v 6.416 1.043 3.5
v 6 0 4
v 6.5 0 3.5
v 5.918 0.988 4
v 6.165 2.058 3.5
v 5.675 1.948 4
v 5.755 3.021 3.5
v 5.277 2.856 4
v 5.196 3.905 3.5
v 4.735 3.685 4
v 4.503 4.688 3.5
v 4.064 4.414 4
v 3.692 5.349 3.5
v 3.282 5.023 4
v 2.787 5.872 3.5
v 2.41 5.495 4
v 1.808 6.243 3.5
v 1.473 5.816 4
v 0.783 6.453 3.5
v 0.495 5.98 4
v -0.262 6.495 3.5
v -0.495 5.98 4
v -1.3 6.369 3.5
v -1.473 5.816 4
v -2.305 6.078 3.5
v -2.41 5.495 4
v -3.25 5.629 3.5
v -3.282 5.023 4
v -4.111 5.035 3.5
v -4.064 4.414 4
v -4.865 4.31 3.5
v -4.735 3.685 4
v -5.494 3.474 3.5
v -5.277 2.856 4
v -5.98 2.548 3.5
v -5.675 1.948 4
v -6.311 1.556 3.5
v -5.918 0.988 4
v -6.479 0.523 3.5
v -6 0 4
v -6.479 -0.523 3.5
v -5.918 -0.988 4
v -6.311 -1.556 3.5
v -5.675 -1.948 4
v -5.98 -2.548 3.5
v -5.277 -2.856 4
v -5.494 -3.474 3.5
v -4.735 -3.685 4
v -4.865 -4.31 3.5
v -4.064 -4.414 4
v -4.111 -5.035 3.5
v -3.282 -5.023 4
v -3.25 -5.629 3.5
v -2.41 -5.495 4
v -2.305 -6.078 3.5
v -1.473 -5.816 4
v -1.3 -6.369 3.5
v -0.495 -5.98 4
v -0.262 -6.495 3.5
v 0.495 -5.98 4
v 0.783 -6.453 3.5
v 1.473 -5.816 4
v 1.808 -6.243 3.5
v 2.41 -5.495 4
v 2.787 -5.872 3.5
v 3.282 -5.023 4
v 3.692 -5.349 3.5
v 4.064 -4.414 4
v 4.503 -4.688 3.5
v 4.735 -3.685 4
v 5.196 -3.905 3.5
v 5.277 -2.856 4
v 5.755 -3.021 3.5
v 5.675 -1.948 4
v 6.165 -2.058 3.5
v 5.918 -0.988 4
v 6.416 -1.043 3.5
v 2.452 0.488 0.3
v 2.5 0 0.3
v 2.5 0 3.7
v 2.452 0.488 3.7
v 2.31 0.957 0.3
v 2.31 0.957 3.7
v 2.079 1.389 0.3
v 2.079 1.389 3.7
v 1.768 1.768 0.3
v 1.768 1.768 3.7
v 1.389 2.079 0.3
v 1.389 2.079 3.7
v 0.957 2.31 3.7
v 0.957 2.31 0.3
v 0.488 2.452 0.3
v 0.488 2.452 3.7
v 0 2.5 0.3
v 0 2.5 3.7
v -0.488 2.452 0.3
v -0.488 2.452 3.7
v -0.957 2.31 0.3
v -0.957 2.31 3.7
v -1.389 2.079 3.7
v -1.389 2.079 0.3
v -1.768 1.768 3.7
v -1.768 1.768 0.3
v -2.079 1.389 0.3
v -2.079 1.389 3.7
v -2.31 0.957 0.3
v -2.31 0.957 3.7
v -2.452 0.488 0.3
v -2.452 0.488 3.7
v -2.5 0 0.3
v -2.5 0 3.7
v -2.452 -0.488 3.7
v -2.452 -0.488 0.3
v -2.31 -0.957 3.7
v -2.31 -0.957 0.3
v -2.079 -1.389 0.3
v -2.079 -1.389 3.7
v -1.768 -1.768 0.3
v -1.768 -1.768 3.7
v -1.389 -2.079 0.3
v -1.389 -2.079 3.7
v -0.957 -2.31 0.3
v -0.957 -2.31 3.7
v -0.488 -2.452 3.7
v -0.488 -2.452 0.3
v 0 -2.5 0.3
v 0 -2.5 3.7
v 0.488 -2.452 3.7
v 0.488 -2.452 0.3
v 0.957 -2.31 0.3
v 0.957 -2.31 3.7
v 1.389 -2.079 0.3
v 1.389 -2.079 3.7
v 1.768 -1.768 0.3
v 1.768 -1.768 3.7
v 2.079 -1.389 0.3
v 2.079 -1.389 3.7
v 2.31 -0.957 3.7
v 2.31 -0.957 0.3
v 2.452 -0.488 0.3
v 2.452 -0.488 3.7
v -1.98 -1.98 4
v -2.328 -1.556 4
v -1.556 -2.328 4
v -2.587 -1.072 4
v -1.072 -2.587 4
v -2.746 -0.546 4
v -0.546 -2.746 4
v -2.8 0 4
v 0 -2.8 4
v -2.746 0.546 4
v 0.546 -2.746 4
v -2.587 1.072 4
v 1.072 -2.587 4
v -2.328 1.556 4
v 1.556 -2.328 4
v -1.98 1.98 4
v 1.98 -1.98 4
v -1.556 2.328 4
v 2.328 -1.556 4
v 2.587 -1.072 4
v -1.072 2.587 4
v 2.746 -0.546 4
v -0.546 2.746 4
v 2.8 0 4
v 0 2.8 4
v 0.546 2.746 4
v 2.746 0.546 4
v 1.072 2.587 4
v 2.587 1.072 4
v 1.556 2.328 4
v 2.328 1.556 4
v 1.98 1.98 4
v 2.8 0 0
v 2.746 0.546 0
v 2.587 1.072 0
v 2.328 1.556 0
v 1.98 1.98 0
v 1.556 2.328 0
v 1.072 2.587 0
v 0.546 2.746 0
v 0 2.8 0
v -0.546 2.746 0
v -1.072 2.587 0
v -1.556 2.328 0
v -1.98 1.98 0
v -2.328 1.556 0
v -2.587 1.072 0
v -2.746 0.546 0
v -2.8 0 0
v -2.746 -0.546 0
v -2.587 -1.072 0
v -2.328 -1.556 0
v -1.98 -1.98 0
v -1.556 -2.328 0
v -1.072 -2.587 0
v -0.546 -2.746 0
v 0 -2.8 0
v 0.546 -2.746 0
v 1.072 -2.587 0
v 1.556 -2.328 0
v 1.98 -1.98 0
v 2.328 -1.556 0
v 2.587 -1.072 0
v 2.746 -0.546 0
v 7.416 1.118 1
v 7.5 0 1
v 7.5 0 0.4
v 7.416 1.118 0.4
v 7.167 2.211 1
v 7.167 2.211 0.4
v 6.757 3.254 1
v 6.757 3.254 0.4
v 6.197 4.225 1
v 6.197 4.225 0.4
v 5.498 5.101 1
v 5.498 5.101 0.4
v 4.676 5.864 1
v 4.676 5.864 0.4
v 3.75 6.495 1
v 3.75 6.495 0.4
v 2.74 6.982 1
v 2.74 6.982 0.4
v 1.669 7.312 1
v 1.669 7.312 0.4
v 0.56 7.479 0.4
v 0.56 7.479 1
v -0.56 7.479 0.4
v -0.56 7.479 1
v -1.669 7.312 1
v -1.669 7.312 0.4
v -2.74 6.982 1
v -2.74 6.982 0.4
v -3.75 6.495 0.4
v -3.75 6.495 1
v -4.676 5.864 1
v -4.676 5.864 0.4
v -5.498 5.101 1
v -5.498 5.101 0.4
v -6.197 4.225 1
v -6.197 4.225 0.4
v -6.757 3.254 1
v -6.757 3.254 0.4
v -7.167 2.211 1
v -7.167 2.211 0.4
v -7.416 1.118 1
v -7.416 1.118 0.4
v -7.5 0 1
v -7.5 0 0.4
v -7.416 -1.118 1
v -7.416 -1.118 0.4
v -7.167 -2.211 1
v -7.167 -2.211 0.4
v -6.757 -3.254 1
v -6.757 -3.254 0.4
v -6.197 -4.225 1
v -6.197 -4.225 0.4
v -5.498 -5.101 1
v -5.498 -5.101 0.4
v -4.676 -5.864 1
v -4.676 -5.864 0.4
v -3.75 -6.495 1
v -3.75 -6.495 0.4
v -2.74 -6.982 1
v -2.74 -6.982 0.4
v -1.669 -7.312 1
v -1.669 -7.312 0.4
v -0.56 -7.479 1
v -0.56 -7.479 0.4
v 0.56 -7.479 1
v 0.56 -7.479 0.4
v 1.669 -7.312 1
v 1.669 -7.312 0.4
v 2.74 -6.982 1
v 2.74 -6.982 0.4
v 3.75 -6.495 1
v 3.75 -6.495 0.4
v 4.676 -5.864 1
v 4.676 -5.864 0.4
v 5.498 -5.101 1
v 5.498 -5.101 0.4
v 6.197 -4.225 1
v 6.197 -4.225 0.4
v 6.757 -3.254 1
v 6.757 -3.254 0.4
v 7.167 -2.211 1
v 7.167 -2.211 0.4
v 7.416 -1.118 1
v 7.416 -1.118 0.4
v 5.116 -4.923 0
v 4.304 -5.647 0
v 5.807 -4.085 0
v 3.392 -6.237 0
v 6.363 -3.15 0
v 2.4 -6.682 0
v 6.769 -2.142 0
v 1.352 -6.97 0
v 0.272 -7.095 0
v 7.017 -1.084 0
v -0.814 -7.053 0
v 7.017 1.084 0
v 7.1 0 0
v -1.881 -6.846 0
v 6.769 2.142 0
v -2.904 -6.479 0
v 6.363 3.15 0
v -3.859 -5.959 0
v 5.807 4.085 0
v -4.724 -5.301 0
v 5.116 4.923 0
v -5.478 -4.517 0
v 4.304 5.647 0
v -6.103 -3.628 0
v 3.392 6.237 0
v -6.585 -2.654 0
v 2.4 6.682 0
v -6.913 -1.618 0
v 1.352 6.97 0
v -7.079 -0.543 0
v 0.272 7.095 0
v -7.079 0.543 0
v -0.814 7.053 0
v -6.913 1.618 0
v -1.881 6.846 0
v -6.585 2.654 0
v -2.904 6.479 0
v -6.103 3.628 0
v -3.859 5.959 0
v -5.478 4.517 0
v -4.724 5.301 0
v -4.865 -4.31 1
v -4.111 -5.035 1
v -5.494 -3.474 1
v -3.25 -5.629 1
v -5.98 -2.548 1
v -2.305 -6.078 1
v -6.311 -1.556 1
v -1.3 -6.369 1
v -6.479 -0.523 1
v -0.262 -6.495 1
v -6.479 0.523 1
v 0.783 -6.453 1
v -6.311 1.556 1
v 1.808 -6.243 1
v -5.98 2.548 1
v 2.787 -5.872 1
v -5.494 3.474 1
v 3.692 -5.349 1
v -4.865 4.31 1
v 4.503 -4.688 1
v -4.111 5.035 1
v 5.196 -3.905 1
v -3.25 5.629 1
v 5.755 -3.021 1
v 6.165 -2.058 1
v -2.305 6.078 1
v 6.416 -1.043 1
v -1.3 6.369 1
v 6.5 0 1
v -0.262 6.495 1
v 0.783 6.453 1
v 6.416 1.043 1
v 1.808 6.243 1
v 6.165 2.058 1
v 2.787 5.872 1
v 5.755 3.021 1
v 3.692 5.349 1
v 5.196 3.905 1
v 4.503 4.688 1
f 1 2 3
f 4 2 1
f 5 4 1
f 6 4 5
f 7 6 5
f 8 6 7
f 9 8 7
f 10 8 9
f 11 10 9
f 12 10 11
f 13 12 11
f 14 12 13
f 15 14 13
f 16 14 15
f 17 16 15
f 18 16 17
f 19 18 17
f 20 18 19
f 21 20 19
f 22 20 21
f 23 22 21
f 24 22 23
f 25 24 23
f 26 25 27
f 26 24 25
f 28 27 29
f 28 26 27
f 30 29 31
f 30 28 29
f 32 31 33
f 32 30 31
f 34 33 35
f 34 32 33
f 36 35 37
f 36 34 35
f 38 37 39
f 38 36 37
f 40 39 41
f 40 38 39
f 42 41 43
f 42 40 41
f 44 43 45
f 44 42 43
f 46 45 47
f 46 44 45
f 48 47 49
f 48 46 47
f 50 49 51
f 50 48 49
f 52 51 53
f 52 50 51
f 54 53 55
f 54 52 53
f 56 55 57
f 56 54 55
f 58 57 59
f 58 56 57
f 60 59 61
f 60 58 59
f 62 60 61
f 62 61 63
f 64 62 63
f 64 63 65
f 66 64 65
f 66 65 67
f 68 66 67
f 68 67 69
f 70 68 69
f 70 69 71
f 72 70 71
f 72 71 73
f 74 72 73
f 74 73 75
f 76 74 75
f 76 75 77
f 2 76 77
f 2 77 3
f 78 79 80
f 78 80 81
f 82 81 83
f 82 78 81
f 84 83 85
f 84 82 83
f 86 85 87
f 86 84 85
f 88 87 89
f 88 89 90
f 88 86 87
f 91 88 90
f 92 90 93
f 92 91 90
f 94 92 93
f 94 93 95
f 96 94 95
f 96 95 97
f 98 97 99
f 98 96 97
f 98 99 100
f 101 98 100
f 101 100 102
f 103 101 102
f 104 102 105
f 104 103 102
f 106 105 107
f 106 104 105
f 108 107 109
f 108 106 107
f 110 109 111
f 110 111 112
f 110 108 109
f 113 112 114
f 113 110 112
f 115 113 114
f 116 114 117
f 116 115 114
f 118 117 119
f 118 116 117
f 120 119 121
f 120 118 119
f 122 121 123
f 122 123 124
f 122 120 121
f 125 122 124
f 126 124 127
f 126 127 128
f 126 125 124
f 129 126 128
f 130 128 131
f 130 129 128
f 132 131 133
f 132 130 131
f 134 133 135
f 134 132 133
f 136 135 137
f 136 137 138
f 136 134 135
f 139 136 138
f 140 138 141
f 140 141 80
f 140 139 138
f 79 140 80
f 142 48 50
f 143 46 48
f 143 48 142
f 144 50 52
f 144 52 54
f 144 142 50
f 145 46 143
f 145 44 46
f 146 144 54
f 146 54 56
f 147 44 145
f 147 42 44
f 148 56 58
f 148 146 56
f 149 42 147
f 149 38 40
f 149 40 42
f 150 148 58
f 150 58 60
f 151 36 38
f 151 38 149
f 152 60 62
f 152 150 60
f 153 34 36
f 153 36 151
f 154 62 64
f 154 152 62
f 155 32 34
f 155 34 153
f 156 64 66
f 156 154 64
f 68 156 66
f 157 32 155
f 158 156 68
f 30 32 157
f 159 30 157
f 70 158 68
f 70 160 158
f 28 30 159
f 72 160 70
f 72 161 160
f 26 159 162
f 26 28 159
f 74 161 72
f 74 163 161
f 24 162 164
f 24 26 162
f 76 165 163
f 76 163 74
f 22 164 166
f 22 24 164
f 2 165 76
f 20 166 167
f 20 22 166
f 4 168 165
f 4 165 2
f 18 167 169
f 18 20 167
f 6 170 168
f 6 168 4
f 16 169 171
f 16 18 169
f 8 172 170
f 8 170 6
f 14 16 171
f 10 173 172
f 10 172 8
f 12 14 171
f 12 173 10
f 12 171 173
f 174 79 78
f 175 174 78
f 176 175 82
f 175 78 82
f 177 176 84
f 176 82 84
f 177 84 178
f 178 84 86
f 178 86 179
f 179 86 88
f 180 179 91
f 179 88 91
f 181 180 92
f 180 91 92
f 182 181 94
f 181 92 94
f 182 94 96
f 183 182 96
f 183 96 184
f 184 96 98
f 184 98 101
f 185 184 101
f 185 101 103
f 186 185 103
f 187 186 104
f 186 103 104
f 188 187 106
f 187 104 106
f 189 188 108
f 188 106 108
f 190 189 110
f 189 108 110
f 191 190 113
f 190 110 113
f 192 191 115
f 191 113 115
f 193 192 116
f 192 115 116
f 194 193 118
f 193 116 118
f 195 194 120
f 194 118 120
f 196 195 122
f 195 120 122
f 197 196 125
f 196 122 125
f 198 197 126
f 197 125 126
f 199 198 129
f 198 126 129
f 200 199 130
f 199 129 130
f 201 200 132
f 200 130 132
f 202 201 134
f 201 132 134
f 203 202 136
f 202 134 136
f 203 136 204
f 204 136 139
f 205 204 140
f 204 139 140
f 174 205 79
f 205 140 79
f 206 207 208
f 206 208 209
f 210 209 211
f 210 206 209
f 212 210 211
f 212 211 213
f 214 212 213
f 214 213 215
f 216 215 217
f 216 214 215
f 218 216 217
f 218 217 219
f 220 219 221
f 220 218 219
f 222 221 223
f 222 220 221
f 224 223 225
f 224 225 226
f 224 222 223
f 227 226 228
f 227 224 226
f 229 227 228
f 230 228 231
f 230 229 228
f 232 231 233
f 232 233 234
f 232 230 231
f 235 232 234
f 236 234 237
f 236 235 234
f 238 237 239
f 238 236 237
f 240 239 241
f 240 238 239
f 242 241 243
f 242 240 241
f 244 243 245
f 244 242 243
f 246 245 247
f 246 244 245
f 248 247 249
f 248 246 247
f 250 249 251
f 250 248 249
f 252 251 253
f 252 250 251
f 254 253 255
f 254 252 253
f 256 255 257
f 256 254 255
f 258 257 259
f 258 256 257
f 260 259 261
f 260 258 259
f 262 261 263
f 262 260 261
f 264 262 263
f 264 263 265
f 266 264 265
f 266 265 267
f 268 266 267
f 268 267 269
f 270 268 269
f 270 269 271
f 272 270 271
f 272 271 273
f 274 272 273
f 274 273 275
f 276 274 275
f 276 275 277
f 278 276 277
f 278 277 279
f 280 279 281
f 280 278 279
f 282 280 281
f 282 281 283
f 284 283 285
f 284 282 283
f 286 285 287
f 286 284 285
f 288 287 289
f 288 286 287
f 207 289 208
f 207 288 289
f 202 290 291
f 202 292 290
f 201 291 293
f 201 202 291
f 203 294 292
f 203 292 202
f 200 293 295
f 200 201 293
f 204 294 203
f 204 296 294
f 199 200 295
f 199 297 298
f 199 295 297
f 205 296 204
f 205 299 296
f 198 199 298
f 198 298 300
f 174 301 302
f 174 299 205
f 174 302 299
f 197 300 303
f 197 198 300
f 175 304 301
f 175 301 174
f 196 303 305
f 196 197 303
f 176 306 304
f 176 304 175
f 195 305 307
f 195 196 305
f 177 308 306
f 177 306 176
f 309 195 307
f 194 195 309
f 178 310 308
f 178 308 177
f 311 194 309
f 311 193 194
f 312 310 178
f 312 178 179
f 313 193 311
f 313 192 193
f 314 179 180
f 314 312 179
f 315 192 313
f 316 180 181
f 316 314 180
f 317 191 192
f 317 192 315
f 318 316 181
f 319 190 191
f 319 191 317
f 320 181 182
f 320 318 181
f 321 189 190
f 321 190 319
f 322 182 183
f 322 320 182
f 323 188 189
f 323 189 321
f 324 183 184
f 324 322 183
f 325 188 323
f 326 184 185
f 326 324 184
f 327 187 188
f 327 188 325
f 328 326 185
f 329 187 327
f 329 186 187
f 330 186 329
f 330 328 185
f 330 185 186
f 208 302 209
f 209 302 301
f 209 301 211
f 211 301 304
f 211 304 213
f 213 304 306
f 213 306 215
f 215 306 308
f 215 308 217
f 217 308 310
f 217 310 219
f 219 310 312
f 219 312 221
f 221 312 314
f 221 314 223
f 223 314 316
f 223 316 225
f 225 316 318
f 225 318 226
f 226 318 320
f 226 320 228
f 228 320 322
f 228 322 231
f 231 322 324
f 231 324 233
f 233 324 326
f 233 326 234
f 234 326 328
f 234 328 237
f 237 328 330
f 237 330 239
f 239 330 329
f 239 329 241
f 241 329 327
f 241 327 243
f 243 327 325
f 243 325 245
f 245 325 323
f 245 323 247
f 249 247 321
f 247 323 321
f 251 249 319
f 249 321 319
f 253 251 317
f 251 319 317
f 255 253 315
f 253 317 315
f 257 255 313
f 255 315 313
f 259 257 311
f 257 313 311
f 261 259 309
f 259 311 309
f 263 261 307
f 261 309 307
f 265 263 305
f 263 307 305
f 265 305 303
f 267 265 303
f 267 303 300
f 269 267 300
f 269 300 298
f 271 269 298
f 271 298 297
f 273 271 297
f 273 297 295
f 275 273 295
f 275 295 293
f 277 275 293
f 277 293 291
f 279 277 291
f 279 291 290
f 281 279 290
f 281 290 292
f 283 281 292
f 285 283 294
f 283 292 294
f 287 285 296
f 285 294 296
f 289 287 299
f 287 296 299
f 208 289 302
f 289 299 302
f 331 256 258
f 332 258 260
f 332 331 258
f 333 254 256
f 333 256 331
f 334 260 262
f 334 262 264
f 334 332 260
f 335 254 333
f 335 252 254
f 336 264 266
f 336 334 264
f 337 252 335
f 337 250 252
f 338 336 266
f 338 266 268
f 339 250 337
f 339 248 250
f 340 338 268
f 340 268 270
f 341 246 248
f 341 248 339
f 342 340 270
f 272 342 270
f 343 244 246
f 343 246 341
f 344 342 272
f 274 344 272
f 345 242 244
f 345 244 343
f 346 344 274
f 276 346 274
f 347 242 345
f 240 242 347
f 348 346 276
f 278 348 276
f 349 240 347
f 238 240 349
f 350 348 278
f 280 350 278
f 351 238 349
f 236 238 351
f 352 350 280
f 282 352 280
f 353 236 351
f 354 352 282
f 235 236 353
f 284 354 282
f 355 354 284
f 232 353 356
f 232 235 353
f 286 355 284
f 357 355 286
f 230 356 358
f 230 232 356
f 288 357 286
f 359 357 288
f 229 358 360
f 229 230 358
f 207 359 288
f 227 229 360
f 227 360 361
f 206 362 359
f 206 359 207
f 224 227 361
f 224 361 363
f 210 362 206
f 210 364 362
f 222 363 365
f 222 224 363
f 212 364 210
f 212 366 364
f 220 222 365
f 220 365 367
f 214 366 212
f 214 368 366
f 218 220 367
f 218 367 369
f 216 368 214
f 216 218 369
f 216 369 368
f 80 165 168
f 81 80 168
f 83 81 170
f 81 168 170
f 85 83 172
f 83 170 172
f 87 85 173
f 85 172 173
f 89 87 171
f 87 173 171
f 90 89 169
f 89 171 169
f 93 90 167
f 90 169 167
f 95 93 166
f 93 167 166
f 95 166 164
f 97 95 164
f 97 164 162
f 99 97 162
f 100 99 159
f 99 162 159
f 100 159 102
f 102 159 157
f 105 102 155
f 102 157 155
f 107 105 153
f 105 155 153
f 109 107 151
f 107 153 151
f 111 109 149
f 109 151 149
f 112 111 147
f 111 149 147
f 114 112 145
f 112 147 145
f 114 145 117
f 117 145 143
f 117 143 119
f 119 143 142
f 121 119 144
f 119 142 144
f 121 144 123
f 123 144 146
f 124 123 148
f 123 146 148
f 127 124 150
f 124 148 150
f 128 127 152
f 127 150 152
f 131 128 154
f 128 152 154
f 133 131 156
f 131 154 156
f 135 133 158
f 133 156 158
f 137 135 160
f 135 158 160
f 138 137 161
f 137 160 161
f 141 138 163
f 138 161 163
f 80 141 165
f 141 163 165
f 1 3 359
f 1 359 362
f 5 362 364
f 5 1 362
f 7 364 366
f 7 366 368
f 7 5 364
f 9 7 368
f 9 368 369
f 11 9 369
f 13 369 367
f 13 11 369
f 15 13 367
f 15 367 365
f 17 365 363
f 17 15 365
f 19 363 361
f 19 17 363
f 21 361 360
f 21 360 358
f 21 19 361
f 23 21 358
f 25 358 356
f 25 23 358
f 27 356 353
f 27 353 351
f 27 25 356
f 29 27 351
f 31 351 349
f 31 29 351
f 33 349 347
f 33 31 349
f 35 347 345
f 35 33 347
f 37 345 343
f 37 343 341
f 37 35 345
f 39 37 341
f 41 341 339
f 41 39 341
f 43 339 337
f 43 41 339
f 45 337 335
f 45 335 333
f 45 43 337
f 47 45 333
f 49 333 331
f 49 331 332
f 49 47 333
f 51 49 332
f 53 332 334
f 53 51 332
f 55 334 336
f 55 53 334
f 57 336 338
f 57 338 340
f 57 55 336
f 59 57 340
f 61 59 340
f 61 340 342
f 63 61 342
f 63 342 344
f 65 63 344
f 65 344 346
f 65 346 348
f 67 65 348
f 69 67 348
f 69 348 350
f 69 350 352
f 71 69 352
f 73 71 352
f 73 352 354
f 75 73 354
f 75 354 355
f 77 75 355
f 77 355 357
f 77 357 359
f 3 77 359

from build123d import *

# Parameters (mm, degrees)
F2_SIZE = 0.5
F3_SIZE = 0.4
F4_SIZE = 0.3


with BuildPart() as f1:
    # F0 (on Front) → F1 (revolve)
    with BuildSketch(Plane.XZ):
        Polygon((2.5, 0), (7.5, 0), (7.5, 1), (6.5, 1), (6.5, 4), (2.5, 4), align=None)
    revolve(axis=Axis((0, 0, 10.44), (0, 0, 1)))

    # F2
    f2_edges = [f1.edges().sort_by_distance(p)[0] for p in [
        (-6.5, 0, 4),
    ]]
    chamfer(f2_edges, length=F2_SIZE)

    # F3
    f3_edges = [f1.edges().sort_by_distance(p)[0] for p in [
        (-7.5, 0, 0),
    ]]
    chamfer(f3_edges, length=F3_SIZE)

    # F4
    f4_edges = [f1.edges().sort_by_distance(p)[0] for p in [
        (-2.5, 0, 0),
        (-2.5, 0, 4),
    ]]
    chamfer(f4_edges, length=F4_SIZE)


solid = f1.part
